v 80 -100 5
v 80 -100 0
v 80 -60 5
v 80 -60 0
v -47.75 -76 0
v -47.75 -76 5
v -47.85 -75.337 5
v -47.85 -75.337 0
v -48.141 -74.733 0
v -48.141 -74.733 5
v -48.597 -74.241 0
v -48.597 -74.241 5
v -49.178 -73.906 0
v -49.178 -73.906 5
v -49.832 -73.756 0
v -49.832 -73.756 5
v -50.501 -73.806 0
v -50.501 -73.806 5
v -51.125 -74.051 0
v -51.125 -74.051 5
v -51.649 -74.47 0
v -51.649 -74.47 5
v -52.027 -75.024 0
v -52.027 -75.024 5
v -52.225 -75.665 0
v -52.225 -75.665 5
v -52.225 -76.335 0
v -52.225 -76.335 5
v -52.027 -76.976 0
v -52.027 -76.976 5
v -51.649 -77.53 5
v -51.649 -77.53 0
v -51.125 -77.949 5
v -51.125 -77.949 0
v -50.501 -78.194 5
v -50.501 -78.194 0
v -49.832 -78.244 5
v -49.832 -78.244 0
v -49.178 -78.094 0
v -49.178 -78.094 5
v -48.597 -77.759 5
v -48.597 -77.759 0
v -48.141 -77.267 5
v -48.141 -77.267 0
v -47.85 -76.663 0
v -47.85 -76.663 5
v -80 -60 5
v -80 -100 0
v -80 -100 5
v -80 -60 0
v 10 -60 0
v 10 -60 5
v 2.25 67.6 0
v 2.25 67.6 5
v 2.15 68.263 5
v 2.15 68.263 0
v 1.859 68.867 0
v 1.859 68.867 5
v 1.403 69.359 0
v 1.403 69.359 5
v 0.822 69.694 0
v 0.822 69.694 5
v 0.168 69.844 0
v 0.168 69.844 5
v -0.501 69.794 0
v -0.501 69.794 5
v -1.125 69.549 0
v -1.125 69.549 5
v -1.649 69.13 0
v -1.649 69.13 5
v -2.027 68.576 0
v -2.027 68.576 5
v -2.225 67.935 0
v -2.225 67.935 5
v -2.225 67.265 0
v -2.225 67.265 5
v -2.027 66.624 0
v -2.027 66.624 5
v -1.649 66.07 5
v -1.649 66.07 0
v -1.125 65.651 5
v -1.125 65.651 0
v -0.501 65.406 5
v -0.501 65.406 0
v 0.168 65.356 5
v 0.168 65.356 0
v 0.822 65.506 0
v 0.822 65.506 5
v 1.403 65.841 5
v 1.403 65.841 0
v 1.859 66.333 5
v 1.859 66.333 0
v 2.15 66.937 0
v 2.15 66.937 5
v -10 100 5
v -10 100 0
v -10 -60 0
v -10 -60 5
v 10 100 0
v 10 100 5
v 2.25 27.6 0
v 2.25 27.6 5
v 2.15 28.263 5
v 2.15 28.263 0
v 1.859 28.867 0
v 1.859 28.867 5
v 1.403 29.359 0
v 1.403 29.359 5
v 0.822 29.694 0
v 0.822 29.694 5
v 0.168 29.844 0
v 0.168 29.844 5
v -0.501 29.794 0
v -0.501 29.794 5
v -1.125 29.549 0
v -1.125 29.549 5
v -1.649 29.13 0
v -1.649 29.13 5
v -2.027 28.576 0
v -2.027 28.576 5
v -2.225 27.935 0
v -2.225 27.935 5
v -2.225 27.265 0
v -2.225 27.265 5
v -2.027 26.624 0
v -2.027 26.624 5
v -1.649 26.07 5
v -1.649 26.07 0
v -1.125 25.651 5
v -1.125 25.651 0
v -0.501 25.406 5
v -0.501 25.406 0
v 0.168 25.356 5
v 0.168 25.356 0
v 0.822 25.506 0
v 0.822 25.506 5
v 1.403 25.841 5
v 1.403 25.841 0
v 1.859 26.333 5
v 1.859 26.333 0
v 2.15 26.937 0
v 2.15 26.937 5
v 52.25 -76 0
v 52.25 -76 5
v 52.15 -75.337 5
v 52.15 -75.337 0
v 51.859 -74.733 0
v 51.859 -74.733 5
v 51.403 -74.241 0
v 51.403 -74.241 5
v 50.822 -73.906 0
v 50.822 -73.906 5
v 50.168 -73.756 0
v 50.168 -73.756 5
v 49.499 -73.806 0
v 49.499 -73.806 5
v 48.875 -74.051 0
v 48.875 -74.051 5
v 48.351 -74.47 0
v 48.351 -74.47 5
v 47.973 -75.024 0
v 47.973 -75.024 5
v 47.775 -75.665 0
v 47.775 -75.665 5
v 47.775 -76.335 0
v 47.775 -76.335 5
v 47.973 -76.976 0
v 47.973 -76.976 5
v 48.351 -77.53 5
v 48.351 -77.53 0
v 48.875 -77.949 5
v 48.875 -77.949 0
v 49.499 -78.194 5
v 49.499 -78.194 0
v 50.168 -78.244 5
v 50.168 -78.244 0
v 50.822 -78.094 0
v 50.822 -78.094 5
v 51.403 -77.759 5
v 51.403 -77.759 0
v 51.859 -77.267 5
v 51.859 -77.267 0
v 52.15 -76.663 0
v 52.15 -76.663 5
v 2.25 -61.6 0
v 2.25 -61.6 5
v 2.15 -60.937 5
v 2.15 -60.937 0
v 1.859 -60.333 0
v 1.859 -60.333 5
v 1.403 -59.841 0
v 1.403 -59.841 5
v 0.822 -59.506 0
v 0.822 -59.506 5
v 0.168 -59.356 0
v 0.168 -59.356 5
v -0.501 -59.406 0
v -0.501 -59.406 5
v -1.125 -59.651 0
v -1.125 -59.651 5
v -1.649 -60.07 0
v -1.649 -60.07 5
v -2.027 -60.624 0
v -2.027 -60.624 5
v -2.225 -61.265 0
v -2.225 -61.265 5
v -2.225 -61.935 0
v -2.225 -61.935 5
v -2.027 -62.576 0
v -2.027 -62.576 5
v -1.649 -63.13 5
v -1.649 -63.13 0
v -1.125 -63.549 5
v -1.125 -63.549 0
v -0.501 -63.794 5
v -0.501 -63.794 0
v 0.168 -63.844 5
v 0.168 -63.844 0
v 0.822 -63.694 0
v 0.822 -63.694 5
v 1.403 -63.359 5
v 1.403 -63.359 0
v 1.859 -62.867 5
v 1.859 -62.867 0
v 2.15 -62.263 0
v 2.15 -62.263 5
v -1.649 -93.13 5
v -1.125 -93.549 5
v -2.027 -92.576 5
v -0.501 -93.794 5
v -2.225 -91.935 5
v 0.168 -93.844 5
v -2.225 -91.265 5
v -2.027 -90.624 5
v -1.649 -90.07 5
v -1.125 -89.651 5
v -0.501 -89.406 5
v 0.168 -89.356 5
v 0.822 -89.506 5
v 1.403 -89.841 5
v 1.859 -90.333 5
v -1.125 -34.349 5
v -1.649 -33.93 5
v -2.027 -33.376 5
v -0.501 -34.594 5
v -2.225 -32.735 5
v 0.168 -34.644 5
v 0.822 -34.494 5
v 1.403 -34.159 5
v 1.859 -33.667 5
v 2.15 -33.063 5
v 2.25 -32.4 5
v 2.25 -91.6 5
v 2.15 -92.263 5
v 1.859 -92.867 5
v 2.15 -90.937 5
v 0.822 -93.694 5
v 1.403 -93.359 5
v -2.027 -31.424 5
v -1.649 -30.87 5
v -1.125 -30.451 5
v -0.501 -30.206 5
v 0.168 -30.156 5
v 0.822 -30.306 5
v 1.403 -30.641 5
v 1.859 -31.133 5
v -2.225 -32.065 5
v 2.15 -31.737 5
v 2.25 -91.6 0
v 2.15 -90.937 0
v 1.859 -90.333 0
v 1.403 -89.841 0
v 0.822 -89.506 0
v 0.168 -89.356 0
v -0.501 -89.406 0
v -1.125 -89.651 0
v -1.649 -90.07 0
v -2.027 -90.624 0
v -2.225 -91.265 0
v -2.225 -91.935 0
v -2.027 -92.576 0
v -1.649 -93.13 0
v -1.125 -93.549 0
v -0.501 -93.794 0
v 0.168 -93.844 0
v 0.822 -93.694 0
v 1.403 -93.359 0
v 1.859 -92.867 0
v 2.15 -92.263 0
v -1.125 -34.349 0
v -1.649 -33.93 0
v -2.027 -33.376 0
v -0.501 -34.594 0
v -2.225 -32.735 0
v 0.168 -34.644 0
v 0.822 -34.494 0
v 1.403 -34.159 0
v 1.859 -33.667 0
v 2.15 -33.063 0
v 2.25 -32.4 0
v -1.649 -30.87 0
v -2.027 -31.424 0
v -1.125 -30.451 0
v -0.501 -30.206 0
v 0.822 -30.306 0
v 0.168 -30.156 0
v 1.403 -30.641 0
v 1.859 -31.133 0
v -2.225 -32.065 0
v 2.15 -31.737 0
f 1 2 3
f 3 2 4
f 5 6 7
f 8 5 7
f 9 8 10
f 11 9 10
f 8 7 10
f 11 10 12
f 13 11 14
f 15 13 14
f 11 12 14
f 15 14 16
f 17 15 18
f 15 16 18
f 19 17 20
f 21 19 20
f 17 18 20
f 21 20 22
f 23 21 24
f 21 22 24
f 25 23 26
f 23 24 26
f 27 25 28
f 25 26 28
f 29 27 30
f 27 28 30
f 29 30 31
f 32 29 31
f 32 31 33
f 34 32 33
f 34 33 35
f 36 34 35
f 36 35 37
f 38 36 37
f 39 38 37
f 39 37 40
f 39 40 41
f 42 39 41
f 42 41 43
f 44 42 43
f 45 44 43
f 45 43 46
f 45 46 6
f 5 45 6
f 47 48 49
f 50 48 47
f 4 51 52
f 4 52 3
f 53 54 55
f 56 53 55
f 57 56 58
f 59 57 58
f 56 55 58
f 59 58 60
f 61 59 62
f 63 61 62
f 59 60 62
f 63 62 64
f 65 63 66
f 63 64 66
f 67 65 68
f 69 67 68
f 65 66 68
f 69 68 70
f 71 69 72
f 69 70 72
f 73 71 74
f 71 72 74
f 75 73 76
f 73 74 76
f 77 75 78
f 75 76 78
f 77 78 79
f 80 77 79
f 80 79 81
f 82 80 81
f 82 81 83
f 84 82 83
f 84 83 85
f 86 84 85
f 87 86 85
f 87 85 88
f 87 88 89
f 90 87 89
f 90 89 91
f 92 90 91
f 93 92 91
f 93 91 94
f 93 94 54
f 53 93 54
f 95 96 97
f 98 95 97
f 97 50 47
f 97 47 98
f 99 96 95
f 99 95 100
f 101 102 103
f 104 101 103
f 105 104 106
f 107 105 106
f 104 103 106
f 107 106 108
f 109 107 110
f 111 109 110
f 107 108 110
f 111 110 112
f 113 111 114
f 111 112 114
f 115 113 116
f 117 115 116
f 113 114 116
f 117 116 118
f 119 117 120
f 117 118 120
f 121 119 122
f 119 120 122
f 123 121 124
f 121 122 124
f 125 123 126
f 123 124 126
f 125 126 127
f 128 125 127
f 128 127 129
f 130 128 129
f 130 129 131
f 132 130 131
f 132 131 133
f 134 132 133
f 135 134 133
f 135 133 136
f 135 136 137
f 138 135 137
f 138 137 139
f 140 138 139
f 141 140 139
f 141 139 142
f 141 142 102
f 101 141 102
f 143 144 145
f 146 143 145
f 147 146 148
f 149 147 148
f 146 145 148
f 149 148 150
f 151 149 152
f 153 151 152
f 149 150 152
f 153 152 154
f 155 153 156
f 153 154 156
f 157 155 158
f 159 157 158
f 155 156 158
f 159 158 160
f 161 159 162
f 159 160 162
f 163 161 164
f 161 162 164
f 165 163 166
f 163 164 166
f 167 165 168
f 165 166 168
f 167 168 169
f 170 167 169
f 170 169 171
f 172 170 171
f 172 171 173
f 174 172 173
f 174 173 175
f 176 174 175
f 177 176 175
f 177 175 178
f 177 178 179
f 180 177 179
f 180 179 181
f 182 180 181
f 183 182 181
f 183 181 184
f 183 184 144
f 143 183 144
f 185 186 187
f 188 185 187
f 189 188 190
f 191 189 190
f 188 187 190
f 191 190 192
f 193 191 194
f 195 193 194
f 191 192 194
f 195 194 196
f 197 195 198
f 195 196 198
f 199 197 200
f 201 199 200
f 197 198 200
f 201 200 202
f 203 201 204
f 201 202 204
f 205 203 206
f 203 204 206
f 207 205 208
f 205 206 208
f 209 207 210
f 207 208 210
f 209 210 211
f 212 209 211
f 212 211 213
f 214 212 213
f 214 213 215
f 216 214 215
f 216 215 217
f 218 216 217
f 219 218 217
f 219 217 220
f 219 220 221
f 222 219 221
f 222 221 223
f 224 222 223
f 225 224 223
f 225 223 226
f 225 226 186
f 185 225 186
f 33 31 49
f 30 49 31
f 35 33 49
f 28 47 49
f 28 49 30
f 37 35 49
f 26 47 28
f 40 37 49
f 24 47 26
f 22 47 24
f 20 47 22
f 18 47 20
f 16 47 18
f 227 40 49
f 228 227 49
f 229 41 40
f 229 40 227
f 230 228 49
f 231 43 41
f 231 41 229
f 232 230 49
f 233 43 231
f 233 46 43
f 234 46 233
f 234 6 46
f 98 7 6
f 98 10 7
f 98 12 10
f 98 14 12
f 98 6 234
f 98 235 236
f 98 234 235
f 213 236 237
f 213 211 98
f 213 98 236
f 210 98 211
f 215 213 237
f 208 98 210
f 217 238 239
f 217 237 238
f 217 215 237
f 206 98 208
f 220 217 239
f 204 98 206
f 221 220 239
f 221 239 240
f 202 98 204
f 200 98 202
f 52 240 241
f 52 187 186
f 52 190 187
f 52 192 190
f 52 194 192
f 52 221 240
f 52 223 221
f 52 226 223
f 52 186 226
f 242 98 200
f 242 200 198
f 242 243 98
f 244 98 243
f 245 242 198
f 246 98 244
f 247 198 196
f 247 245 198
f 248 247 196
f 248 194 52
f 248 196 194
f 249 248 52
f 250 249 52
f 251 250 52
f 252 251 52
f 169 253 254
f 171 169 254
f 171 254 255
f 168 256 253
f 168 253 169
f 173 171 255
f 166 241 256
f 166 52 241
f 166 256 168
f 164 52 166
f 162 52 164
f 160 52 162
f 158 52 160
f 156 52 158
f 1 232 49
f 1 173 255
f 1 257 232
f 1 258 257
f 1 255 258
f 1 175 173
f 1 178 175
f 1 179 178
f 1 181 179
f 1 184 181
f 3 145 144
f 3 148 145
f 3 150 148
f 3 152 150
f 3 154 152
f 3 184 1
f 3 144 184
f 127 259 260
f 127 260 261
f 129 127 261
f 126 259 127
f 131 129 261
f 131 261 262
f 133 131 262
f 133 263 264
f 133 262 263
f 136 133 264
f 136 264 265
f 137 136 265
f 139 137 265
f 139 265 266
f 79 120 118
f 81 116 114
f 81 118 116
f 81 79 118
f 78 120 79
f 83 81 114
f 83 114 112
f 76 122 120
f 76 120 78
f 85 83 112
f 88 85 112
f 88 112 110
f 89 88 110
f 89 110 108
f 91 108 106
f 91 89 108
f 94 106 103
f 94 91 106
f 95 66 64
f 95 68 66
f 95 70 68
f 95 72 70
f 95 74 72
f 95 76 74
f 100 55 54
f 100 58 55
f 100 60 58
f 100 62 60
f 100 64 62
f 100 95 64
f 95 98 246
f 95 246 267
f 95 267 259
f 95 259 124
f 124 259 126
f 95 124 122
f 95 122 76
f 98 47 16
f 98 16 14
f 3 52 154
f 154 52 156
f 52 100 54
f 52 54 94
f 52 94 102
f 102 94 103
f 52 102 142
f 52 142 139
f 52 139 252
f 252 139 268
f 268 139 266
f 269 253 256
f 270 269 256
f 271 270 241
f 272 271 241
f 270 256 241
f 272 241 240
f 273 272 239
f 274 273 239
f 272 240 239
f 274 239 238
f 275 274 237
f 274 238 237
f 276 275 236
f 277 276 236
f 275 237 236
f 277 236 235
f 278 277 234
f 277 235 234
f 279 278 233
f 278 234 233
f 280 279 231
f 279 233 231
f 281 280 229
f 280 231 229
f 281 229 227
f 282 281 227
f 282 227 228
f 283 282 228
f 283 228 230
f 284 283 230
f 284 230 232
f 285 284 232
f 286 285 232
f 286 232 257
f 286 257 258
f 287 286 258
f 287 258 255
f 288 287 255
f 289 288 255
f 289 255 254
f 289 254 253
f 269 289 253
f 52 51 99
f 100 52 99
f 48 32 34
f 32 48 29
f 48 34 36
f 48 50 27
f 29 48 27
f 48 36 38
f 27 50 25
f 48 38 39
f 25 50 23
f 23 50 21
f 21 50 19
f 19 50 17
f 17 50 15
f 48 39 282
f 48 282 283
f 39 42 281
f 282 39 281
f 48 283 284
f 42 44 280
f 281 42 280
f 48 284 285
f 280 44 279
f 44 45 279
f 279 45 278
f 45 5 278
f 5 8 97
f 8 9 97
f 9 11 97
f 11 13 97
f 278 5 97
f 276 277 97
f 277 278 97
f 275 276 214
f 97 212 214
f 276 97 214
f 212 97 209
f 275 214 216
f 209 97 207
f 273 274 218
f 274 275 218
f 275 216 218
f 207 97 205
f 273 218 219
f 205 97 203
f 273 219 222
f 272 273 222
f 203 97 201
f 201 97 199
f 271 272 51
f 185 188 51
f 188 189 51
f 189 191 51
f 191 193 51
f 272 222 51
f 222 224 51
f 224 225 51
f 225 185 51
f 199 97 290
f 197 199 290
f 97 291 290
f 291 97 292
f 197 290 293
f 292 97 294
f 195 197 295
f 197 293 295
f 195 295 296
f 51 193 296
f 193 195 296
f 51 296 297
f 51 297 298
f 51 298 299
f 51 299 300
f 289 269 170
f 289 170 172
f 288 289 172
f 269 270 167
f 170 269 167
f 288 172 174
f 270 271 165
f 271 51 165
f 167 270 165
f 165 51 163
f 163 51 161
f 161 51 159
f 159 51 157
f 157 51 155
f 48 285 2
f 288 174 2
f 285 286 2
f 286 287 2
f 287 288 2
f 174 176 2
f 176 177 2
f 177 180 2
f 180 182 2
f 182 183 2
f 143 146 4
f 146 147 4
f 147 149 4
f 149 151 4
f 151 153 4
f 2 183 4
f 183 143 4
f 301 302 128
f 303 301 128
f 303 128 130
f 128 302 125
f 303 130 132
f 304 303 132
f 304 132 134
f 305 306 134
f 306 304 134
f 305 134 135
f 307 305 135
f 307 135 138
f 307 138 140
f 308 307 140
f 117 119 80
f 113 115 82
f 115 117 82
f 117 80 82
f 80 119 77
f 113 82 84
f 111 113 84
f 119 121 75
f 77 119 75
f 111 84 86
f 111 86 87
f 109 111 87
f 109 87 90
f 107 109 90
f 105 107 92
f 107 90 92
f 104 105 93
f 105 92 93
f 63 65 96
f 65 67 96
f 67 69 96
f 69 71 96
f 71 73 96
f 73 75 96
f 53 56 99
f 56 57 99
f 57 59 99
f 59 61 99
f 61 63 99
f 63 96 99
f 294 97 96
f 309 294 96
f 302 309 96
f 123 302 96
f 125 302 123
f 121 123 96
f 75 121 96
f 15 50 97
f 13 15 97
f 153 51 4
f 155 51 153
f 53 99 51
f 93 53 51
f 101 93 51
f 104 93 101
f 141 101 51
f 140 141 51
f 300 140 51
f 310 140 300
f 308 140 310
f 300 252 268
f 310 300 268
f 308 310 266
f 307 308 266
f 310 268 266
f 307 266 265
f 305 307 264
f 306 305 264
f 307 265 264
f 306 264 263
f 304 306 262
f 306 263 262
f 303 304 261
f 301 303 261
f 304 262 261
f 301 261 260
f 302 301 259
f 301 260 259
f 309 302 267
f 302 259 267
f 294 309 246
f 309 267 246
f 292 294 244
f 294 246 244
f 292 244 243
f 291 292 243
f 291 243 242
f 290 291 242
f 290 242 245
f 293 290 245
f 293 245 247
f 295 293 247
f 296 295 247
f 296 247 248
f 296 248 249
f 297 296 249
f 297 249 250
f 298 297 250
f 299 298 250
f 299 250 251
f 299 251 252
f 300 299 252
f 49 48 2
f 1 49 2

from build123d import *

# Parameters (mm, degrees)
SKETCH1_W           = 20
SKETCH1_H           = 160
SKETCH1_H_2         = 40
SKETCH1_W_2         = 70
BOSS_EXTRUDE1_DEPTH = 5
SKETCH2_R           = 2.25
CUT_EXTRUDE1_DEPTH  = 15


with BuildPart() as part:
    # Sketch1 → Boss-Extrude1 (new body)
    with BuildSketch(Plane.XY):
        with Locations((0, 20)):
            Rectangle(SKETCH1_W, SKETCH1_H)
        with Locations((0, -80)):
            Rectangle(SKETCH1_W, SKETCH1_H_2)
        with Locations((-45, -80)):
            Rectangle(SKETCH1_W_2, SKETCH1_H_2)
        with Locations((45, -80)):
            Rectangle(SKETCH1_W_2, SKETCH1_H_2)
    extrude(amount=BOSS_EXTRUDE1_DEPTH)

    # Sketch2 → Cut-Extrude1 (cut)
    with BuildSketch(Plane.XY.offset(5)):
        with Locations((0, -91.6)):
            Circle(SKETCH2_R)
        with Locations((-50, -76)):
            Circle(SKETCH2_R)
        with Locations((50, -76)):
            Circle(SKETCH2_R)
        with Locations((0, 27.6)):
            Circle(SKETCH2_R)
        with Locations((0, 67.6)):
            Circle(SKETCH2_R)
        with Locations((0, -32.4)):
            Circle(SKETCH2_R)
        with Locations((0, -61.6)):
            Circle(SKETCH2_R)
    extrude(amount=-CUT_EXTRUDE1_DEPTH, mode=Mode.SUBTRACT)


solid = part.part
